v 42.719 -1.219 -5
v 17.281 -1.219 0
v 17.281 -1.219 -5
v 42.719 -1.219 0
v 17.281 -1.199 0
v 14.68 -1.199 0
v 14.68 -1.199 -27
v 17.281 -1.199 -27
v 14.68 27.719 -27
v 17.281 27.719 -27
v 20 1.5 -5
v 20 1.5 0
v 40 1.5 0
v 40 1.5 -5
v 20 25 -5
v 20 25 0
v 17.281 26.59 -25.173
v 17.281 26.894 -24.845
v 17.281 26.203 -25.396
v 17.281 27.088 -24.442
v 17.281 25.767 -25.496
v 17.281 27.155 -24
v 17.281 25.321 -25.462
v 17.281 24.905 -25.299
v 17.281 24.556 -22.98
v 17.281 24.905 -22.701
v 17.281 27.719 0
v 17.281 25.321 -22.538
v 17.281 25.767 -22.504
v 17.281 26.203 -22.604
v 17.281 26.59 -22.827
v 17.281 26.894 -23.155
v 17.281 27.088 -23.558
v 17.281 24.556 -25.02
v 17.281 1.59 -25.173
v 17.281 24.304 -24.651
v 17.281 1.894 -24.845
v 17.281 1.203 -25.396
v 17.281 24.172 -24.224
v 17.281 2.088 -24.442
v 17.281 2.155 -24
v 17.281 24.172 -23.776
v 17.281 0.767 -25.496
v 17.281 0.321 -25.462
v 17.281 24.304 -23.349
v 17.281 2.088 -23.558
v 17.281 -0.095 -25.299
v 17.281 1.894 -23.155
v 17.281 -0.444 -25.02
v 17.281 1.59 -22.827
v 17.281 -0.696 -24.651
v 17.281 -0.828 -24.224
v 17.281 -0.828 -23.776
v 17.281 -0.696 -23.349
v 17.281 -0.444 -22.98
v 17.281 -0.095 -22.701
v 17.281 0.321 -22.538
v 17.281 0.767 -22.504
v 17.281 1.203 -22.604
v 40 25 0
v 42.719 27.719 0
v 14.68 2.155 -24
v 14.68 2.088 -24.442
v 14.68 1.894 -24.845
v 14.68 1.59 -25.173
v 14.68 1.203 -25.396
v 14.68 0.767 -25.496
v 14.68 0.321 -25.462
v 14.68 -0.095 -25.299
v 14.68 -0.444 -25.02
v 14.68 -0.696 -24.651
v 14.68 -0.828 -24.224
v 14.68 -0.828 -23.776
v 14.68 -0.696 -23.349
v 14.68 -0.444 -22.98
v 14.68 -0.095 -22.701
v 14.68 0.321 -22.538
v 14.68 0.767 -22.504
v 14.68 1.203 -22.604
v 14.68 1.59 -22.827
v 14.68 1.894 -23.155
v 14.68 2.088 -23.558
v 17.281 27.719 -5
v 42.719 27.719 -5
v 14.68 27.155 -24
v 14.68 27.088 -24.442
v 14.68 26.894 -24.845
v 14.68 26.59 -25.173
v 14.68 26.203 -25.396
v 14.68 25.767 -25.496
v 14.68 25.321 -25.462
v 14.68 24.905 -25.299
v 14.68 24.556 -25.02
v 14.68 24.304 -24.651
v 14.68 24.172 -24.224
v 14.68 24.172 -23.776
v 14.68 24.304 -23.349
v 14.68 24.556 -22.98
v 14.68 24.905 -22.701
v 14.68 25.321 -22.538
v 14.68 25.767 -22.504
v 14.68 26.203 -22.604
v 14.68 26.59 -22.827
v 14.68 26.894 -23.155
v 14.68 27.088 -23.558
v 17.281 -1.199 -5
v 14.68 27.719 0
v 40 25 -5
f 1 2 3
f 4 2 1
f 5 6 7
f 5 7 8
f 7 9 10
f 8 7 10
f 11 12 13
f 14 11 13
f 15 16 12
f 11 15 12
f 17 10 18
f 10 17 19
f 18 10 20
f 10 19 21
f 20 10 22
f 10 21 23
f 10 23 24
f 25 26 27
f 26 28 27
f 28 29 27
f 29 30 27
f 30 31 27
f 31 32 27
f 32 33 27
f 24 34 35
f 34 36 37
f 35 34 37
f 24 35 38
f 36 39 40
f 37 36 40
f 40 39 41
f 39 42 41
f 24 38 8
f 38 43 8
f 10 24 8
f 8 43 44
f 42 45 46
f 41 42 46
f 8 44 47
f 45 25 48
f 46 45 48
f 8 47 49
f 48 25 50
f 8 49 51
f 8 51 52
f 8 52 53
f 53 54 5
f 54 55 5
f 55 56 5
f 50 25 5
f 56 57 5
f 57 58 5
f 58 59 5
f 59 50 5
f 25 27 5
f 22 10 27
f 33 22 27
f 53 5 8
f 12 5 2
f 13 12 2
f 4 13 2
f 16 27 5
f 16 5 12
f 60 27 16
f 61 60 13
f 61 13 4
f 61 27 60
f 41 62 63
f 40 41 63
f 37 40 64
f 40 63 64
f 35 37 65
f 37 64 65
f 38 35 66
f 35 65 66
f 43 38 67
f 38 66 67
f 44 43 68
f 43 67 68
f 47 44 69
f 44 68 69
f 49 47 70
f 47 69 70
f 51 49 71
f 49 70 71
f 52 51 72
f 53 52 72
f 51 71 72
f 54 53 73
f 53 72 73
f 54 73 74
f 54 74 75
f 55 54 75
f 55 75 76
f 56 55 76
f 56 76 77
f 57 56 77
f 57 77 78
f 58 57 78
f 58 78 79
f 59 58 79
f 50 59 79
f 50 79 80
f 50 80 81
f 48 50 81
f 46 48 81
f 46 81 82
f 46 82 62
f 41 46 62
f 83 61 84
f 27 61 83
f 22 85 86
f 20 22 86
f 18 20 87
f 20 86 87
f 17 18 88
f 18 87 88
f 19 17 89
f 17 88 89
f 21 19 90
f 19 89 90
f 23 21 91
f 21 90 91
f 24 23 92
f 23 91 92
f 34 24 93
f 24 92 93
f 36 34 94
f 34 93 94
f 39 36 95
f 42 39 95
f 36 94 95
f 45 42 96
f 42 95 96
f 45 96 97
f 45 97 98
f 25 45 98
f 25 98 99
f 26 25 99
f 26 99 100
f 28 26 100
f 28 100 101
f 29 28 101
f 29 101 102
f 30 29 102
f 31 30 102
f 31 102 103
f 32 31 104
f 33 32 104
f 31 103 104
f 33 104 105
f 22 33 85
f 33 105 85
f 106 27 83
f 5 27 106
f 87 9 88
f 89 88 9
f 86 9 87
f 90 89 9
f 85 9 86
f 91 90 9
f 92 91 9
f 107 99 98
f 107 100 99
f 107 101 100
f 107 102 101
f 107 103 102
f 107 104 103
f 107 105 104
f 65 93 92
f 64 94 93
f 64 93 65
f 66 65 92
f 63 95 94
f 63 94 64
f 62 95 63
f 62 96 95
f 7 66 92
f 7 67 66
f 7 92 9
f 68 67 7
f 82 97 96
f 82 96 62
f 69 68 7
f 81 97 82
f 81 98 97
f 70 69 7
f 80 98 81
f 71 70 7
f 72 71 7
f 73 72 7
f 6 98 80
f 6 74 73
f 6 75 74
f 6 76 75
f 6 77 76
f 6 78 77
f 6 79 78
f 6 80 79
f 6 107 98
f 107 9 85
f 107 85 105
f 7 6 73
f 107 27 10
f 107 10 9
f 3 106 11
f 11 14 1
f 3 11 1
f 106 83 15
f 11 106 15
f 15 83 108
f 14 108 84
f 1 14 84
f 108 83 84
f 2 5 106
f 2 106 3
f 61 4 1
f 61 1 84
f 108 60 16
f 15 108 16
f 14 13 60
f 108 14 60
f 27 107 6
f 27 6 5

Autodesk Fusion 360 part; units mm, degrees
sketch "Sketch5" plane through (0, 0, 0) normal (0, 0, 1) x (1, 0, 0)
  line L0 (40, 25) -> (20, 25)
  line L1 (20, 25) -> (20, 1.5)
  line L2 (20, 1.5) -> (40, 1.5)
  line L3 (40, 1.5) -> (40, 25)
  line L4 (42.7186, -1.2186) -> (42.7186, 27.7186)
  line L5 (42.7186, 27.7186) -> (17.2814, 27.7186)
  line L6 (17.2814, 27.7186) -> (17.2814, -1.2186)
  line L7 (17.2814, -1.2186) -> (42.7186, -1.2186)
  line L8 (17.2814, 27.7186) -> (14.6795, 27.7186)
  line L9 (14.6795, 27.7186) -> (14.6795, -1.199)
  line L10 (14.6795, -1.199) -> (17.2814, -1.199)
  line L11 (17.2814, -1.199) -> (17.2814, 27.7186)
  dimension "d10" = 20
  dimension "d11" = 23.5
  dimension "d12" = 2.7186
extrude "Extrude4" add sketch "Sketch5" against normal blind 5 contours L4 L5 L6 L7 L11 makes body 1
extrude "Extrude5" add sketch "Sketch5" against normal blind 27 separate body contours L6 L8 L9 L10 L11 makes body 2
sketch "Sketch8" plane through (0, 0, 0) normal (1, 0, 0) x (0, 1, 0)
  circle A0 centre (25.6551, -24) radius 1.5
  circle A1 centre (0.6551, -24) radius 1.5
  dimension "d17" = 3
  dimension "d18" = 25
  dimension "d19" = 3
sketch "Sketch10" plane through (0, 0, 0) normal (1, 0, 0) x (0, 1, 0)
  curve L0
  curve L1
  curve L2
  curve L3
  curve L4
  curve L5
  curve L6
  curve L7
extrude "Extrude6" cut sketch "Sketch8" along normal blind 35 bodies 2
